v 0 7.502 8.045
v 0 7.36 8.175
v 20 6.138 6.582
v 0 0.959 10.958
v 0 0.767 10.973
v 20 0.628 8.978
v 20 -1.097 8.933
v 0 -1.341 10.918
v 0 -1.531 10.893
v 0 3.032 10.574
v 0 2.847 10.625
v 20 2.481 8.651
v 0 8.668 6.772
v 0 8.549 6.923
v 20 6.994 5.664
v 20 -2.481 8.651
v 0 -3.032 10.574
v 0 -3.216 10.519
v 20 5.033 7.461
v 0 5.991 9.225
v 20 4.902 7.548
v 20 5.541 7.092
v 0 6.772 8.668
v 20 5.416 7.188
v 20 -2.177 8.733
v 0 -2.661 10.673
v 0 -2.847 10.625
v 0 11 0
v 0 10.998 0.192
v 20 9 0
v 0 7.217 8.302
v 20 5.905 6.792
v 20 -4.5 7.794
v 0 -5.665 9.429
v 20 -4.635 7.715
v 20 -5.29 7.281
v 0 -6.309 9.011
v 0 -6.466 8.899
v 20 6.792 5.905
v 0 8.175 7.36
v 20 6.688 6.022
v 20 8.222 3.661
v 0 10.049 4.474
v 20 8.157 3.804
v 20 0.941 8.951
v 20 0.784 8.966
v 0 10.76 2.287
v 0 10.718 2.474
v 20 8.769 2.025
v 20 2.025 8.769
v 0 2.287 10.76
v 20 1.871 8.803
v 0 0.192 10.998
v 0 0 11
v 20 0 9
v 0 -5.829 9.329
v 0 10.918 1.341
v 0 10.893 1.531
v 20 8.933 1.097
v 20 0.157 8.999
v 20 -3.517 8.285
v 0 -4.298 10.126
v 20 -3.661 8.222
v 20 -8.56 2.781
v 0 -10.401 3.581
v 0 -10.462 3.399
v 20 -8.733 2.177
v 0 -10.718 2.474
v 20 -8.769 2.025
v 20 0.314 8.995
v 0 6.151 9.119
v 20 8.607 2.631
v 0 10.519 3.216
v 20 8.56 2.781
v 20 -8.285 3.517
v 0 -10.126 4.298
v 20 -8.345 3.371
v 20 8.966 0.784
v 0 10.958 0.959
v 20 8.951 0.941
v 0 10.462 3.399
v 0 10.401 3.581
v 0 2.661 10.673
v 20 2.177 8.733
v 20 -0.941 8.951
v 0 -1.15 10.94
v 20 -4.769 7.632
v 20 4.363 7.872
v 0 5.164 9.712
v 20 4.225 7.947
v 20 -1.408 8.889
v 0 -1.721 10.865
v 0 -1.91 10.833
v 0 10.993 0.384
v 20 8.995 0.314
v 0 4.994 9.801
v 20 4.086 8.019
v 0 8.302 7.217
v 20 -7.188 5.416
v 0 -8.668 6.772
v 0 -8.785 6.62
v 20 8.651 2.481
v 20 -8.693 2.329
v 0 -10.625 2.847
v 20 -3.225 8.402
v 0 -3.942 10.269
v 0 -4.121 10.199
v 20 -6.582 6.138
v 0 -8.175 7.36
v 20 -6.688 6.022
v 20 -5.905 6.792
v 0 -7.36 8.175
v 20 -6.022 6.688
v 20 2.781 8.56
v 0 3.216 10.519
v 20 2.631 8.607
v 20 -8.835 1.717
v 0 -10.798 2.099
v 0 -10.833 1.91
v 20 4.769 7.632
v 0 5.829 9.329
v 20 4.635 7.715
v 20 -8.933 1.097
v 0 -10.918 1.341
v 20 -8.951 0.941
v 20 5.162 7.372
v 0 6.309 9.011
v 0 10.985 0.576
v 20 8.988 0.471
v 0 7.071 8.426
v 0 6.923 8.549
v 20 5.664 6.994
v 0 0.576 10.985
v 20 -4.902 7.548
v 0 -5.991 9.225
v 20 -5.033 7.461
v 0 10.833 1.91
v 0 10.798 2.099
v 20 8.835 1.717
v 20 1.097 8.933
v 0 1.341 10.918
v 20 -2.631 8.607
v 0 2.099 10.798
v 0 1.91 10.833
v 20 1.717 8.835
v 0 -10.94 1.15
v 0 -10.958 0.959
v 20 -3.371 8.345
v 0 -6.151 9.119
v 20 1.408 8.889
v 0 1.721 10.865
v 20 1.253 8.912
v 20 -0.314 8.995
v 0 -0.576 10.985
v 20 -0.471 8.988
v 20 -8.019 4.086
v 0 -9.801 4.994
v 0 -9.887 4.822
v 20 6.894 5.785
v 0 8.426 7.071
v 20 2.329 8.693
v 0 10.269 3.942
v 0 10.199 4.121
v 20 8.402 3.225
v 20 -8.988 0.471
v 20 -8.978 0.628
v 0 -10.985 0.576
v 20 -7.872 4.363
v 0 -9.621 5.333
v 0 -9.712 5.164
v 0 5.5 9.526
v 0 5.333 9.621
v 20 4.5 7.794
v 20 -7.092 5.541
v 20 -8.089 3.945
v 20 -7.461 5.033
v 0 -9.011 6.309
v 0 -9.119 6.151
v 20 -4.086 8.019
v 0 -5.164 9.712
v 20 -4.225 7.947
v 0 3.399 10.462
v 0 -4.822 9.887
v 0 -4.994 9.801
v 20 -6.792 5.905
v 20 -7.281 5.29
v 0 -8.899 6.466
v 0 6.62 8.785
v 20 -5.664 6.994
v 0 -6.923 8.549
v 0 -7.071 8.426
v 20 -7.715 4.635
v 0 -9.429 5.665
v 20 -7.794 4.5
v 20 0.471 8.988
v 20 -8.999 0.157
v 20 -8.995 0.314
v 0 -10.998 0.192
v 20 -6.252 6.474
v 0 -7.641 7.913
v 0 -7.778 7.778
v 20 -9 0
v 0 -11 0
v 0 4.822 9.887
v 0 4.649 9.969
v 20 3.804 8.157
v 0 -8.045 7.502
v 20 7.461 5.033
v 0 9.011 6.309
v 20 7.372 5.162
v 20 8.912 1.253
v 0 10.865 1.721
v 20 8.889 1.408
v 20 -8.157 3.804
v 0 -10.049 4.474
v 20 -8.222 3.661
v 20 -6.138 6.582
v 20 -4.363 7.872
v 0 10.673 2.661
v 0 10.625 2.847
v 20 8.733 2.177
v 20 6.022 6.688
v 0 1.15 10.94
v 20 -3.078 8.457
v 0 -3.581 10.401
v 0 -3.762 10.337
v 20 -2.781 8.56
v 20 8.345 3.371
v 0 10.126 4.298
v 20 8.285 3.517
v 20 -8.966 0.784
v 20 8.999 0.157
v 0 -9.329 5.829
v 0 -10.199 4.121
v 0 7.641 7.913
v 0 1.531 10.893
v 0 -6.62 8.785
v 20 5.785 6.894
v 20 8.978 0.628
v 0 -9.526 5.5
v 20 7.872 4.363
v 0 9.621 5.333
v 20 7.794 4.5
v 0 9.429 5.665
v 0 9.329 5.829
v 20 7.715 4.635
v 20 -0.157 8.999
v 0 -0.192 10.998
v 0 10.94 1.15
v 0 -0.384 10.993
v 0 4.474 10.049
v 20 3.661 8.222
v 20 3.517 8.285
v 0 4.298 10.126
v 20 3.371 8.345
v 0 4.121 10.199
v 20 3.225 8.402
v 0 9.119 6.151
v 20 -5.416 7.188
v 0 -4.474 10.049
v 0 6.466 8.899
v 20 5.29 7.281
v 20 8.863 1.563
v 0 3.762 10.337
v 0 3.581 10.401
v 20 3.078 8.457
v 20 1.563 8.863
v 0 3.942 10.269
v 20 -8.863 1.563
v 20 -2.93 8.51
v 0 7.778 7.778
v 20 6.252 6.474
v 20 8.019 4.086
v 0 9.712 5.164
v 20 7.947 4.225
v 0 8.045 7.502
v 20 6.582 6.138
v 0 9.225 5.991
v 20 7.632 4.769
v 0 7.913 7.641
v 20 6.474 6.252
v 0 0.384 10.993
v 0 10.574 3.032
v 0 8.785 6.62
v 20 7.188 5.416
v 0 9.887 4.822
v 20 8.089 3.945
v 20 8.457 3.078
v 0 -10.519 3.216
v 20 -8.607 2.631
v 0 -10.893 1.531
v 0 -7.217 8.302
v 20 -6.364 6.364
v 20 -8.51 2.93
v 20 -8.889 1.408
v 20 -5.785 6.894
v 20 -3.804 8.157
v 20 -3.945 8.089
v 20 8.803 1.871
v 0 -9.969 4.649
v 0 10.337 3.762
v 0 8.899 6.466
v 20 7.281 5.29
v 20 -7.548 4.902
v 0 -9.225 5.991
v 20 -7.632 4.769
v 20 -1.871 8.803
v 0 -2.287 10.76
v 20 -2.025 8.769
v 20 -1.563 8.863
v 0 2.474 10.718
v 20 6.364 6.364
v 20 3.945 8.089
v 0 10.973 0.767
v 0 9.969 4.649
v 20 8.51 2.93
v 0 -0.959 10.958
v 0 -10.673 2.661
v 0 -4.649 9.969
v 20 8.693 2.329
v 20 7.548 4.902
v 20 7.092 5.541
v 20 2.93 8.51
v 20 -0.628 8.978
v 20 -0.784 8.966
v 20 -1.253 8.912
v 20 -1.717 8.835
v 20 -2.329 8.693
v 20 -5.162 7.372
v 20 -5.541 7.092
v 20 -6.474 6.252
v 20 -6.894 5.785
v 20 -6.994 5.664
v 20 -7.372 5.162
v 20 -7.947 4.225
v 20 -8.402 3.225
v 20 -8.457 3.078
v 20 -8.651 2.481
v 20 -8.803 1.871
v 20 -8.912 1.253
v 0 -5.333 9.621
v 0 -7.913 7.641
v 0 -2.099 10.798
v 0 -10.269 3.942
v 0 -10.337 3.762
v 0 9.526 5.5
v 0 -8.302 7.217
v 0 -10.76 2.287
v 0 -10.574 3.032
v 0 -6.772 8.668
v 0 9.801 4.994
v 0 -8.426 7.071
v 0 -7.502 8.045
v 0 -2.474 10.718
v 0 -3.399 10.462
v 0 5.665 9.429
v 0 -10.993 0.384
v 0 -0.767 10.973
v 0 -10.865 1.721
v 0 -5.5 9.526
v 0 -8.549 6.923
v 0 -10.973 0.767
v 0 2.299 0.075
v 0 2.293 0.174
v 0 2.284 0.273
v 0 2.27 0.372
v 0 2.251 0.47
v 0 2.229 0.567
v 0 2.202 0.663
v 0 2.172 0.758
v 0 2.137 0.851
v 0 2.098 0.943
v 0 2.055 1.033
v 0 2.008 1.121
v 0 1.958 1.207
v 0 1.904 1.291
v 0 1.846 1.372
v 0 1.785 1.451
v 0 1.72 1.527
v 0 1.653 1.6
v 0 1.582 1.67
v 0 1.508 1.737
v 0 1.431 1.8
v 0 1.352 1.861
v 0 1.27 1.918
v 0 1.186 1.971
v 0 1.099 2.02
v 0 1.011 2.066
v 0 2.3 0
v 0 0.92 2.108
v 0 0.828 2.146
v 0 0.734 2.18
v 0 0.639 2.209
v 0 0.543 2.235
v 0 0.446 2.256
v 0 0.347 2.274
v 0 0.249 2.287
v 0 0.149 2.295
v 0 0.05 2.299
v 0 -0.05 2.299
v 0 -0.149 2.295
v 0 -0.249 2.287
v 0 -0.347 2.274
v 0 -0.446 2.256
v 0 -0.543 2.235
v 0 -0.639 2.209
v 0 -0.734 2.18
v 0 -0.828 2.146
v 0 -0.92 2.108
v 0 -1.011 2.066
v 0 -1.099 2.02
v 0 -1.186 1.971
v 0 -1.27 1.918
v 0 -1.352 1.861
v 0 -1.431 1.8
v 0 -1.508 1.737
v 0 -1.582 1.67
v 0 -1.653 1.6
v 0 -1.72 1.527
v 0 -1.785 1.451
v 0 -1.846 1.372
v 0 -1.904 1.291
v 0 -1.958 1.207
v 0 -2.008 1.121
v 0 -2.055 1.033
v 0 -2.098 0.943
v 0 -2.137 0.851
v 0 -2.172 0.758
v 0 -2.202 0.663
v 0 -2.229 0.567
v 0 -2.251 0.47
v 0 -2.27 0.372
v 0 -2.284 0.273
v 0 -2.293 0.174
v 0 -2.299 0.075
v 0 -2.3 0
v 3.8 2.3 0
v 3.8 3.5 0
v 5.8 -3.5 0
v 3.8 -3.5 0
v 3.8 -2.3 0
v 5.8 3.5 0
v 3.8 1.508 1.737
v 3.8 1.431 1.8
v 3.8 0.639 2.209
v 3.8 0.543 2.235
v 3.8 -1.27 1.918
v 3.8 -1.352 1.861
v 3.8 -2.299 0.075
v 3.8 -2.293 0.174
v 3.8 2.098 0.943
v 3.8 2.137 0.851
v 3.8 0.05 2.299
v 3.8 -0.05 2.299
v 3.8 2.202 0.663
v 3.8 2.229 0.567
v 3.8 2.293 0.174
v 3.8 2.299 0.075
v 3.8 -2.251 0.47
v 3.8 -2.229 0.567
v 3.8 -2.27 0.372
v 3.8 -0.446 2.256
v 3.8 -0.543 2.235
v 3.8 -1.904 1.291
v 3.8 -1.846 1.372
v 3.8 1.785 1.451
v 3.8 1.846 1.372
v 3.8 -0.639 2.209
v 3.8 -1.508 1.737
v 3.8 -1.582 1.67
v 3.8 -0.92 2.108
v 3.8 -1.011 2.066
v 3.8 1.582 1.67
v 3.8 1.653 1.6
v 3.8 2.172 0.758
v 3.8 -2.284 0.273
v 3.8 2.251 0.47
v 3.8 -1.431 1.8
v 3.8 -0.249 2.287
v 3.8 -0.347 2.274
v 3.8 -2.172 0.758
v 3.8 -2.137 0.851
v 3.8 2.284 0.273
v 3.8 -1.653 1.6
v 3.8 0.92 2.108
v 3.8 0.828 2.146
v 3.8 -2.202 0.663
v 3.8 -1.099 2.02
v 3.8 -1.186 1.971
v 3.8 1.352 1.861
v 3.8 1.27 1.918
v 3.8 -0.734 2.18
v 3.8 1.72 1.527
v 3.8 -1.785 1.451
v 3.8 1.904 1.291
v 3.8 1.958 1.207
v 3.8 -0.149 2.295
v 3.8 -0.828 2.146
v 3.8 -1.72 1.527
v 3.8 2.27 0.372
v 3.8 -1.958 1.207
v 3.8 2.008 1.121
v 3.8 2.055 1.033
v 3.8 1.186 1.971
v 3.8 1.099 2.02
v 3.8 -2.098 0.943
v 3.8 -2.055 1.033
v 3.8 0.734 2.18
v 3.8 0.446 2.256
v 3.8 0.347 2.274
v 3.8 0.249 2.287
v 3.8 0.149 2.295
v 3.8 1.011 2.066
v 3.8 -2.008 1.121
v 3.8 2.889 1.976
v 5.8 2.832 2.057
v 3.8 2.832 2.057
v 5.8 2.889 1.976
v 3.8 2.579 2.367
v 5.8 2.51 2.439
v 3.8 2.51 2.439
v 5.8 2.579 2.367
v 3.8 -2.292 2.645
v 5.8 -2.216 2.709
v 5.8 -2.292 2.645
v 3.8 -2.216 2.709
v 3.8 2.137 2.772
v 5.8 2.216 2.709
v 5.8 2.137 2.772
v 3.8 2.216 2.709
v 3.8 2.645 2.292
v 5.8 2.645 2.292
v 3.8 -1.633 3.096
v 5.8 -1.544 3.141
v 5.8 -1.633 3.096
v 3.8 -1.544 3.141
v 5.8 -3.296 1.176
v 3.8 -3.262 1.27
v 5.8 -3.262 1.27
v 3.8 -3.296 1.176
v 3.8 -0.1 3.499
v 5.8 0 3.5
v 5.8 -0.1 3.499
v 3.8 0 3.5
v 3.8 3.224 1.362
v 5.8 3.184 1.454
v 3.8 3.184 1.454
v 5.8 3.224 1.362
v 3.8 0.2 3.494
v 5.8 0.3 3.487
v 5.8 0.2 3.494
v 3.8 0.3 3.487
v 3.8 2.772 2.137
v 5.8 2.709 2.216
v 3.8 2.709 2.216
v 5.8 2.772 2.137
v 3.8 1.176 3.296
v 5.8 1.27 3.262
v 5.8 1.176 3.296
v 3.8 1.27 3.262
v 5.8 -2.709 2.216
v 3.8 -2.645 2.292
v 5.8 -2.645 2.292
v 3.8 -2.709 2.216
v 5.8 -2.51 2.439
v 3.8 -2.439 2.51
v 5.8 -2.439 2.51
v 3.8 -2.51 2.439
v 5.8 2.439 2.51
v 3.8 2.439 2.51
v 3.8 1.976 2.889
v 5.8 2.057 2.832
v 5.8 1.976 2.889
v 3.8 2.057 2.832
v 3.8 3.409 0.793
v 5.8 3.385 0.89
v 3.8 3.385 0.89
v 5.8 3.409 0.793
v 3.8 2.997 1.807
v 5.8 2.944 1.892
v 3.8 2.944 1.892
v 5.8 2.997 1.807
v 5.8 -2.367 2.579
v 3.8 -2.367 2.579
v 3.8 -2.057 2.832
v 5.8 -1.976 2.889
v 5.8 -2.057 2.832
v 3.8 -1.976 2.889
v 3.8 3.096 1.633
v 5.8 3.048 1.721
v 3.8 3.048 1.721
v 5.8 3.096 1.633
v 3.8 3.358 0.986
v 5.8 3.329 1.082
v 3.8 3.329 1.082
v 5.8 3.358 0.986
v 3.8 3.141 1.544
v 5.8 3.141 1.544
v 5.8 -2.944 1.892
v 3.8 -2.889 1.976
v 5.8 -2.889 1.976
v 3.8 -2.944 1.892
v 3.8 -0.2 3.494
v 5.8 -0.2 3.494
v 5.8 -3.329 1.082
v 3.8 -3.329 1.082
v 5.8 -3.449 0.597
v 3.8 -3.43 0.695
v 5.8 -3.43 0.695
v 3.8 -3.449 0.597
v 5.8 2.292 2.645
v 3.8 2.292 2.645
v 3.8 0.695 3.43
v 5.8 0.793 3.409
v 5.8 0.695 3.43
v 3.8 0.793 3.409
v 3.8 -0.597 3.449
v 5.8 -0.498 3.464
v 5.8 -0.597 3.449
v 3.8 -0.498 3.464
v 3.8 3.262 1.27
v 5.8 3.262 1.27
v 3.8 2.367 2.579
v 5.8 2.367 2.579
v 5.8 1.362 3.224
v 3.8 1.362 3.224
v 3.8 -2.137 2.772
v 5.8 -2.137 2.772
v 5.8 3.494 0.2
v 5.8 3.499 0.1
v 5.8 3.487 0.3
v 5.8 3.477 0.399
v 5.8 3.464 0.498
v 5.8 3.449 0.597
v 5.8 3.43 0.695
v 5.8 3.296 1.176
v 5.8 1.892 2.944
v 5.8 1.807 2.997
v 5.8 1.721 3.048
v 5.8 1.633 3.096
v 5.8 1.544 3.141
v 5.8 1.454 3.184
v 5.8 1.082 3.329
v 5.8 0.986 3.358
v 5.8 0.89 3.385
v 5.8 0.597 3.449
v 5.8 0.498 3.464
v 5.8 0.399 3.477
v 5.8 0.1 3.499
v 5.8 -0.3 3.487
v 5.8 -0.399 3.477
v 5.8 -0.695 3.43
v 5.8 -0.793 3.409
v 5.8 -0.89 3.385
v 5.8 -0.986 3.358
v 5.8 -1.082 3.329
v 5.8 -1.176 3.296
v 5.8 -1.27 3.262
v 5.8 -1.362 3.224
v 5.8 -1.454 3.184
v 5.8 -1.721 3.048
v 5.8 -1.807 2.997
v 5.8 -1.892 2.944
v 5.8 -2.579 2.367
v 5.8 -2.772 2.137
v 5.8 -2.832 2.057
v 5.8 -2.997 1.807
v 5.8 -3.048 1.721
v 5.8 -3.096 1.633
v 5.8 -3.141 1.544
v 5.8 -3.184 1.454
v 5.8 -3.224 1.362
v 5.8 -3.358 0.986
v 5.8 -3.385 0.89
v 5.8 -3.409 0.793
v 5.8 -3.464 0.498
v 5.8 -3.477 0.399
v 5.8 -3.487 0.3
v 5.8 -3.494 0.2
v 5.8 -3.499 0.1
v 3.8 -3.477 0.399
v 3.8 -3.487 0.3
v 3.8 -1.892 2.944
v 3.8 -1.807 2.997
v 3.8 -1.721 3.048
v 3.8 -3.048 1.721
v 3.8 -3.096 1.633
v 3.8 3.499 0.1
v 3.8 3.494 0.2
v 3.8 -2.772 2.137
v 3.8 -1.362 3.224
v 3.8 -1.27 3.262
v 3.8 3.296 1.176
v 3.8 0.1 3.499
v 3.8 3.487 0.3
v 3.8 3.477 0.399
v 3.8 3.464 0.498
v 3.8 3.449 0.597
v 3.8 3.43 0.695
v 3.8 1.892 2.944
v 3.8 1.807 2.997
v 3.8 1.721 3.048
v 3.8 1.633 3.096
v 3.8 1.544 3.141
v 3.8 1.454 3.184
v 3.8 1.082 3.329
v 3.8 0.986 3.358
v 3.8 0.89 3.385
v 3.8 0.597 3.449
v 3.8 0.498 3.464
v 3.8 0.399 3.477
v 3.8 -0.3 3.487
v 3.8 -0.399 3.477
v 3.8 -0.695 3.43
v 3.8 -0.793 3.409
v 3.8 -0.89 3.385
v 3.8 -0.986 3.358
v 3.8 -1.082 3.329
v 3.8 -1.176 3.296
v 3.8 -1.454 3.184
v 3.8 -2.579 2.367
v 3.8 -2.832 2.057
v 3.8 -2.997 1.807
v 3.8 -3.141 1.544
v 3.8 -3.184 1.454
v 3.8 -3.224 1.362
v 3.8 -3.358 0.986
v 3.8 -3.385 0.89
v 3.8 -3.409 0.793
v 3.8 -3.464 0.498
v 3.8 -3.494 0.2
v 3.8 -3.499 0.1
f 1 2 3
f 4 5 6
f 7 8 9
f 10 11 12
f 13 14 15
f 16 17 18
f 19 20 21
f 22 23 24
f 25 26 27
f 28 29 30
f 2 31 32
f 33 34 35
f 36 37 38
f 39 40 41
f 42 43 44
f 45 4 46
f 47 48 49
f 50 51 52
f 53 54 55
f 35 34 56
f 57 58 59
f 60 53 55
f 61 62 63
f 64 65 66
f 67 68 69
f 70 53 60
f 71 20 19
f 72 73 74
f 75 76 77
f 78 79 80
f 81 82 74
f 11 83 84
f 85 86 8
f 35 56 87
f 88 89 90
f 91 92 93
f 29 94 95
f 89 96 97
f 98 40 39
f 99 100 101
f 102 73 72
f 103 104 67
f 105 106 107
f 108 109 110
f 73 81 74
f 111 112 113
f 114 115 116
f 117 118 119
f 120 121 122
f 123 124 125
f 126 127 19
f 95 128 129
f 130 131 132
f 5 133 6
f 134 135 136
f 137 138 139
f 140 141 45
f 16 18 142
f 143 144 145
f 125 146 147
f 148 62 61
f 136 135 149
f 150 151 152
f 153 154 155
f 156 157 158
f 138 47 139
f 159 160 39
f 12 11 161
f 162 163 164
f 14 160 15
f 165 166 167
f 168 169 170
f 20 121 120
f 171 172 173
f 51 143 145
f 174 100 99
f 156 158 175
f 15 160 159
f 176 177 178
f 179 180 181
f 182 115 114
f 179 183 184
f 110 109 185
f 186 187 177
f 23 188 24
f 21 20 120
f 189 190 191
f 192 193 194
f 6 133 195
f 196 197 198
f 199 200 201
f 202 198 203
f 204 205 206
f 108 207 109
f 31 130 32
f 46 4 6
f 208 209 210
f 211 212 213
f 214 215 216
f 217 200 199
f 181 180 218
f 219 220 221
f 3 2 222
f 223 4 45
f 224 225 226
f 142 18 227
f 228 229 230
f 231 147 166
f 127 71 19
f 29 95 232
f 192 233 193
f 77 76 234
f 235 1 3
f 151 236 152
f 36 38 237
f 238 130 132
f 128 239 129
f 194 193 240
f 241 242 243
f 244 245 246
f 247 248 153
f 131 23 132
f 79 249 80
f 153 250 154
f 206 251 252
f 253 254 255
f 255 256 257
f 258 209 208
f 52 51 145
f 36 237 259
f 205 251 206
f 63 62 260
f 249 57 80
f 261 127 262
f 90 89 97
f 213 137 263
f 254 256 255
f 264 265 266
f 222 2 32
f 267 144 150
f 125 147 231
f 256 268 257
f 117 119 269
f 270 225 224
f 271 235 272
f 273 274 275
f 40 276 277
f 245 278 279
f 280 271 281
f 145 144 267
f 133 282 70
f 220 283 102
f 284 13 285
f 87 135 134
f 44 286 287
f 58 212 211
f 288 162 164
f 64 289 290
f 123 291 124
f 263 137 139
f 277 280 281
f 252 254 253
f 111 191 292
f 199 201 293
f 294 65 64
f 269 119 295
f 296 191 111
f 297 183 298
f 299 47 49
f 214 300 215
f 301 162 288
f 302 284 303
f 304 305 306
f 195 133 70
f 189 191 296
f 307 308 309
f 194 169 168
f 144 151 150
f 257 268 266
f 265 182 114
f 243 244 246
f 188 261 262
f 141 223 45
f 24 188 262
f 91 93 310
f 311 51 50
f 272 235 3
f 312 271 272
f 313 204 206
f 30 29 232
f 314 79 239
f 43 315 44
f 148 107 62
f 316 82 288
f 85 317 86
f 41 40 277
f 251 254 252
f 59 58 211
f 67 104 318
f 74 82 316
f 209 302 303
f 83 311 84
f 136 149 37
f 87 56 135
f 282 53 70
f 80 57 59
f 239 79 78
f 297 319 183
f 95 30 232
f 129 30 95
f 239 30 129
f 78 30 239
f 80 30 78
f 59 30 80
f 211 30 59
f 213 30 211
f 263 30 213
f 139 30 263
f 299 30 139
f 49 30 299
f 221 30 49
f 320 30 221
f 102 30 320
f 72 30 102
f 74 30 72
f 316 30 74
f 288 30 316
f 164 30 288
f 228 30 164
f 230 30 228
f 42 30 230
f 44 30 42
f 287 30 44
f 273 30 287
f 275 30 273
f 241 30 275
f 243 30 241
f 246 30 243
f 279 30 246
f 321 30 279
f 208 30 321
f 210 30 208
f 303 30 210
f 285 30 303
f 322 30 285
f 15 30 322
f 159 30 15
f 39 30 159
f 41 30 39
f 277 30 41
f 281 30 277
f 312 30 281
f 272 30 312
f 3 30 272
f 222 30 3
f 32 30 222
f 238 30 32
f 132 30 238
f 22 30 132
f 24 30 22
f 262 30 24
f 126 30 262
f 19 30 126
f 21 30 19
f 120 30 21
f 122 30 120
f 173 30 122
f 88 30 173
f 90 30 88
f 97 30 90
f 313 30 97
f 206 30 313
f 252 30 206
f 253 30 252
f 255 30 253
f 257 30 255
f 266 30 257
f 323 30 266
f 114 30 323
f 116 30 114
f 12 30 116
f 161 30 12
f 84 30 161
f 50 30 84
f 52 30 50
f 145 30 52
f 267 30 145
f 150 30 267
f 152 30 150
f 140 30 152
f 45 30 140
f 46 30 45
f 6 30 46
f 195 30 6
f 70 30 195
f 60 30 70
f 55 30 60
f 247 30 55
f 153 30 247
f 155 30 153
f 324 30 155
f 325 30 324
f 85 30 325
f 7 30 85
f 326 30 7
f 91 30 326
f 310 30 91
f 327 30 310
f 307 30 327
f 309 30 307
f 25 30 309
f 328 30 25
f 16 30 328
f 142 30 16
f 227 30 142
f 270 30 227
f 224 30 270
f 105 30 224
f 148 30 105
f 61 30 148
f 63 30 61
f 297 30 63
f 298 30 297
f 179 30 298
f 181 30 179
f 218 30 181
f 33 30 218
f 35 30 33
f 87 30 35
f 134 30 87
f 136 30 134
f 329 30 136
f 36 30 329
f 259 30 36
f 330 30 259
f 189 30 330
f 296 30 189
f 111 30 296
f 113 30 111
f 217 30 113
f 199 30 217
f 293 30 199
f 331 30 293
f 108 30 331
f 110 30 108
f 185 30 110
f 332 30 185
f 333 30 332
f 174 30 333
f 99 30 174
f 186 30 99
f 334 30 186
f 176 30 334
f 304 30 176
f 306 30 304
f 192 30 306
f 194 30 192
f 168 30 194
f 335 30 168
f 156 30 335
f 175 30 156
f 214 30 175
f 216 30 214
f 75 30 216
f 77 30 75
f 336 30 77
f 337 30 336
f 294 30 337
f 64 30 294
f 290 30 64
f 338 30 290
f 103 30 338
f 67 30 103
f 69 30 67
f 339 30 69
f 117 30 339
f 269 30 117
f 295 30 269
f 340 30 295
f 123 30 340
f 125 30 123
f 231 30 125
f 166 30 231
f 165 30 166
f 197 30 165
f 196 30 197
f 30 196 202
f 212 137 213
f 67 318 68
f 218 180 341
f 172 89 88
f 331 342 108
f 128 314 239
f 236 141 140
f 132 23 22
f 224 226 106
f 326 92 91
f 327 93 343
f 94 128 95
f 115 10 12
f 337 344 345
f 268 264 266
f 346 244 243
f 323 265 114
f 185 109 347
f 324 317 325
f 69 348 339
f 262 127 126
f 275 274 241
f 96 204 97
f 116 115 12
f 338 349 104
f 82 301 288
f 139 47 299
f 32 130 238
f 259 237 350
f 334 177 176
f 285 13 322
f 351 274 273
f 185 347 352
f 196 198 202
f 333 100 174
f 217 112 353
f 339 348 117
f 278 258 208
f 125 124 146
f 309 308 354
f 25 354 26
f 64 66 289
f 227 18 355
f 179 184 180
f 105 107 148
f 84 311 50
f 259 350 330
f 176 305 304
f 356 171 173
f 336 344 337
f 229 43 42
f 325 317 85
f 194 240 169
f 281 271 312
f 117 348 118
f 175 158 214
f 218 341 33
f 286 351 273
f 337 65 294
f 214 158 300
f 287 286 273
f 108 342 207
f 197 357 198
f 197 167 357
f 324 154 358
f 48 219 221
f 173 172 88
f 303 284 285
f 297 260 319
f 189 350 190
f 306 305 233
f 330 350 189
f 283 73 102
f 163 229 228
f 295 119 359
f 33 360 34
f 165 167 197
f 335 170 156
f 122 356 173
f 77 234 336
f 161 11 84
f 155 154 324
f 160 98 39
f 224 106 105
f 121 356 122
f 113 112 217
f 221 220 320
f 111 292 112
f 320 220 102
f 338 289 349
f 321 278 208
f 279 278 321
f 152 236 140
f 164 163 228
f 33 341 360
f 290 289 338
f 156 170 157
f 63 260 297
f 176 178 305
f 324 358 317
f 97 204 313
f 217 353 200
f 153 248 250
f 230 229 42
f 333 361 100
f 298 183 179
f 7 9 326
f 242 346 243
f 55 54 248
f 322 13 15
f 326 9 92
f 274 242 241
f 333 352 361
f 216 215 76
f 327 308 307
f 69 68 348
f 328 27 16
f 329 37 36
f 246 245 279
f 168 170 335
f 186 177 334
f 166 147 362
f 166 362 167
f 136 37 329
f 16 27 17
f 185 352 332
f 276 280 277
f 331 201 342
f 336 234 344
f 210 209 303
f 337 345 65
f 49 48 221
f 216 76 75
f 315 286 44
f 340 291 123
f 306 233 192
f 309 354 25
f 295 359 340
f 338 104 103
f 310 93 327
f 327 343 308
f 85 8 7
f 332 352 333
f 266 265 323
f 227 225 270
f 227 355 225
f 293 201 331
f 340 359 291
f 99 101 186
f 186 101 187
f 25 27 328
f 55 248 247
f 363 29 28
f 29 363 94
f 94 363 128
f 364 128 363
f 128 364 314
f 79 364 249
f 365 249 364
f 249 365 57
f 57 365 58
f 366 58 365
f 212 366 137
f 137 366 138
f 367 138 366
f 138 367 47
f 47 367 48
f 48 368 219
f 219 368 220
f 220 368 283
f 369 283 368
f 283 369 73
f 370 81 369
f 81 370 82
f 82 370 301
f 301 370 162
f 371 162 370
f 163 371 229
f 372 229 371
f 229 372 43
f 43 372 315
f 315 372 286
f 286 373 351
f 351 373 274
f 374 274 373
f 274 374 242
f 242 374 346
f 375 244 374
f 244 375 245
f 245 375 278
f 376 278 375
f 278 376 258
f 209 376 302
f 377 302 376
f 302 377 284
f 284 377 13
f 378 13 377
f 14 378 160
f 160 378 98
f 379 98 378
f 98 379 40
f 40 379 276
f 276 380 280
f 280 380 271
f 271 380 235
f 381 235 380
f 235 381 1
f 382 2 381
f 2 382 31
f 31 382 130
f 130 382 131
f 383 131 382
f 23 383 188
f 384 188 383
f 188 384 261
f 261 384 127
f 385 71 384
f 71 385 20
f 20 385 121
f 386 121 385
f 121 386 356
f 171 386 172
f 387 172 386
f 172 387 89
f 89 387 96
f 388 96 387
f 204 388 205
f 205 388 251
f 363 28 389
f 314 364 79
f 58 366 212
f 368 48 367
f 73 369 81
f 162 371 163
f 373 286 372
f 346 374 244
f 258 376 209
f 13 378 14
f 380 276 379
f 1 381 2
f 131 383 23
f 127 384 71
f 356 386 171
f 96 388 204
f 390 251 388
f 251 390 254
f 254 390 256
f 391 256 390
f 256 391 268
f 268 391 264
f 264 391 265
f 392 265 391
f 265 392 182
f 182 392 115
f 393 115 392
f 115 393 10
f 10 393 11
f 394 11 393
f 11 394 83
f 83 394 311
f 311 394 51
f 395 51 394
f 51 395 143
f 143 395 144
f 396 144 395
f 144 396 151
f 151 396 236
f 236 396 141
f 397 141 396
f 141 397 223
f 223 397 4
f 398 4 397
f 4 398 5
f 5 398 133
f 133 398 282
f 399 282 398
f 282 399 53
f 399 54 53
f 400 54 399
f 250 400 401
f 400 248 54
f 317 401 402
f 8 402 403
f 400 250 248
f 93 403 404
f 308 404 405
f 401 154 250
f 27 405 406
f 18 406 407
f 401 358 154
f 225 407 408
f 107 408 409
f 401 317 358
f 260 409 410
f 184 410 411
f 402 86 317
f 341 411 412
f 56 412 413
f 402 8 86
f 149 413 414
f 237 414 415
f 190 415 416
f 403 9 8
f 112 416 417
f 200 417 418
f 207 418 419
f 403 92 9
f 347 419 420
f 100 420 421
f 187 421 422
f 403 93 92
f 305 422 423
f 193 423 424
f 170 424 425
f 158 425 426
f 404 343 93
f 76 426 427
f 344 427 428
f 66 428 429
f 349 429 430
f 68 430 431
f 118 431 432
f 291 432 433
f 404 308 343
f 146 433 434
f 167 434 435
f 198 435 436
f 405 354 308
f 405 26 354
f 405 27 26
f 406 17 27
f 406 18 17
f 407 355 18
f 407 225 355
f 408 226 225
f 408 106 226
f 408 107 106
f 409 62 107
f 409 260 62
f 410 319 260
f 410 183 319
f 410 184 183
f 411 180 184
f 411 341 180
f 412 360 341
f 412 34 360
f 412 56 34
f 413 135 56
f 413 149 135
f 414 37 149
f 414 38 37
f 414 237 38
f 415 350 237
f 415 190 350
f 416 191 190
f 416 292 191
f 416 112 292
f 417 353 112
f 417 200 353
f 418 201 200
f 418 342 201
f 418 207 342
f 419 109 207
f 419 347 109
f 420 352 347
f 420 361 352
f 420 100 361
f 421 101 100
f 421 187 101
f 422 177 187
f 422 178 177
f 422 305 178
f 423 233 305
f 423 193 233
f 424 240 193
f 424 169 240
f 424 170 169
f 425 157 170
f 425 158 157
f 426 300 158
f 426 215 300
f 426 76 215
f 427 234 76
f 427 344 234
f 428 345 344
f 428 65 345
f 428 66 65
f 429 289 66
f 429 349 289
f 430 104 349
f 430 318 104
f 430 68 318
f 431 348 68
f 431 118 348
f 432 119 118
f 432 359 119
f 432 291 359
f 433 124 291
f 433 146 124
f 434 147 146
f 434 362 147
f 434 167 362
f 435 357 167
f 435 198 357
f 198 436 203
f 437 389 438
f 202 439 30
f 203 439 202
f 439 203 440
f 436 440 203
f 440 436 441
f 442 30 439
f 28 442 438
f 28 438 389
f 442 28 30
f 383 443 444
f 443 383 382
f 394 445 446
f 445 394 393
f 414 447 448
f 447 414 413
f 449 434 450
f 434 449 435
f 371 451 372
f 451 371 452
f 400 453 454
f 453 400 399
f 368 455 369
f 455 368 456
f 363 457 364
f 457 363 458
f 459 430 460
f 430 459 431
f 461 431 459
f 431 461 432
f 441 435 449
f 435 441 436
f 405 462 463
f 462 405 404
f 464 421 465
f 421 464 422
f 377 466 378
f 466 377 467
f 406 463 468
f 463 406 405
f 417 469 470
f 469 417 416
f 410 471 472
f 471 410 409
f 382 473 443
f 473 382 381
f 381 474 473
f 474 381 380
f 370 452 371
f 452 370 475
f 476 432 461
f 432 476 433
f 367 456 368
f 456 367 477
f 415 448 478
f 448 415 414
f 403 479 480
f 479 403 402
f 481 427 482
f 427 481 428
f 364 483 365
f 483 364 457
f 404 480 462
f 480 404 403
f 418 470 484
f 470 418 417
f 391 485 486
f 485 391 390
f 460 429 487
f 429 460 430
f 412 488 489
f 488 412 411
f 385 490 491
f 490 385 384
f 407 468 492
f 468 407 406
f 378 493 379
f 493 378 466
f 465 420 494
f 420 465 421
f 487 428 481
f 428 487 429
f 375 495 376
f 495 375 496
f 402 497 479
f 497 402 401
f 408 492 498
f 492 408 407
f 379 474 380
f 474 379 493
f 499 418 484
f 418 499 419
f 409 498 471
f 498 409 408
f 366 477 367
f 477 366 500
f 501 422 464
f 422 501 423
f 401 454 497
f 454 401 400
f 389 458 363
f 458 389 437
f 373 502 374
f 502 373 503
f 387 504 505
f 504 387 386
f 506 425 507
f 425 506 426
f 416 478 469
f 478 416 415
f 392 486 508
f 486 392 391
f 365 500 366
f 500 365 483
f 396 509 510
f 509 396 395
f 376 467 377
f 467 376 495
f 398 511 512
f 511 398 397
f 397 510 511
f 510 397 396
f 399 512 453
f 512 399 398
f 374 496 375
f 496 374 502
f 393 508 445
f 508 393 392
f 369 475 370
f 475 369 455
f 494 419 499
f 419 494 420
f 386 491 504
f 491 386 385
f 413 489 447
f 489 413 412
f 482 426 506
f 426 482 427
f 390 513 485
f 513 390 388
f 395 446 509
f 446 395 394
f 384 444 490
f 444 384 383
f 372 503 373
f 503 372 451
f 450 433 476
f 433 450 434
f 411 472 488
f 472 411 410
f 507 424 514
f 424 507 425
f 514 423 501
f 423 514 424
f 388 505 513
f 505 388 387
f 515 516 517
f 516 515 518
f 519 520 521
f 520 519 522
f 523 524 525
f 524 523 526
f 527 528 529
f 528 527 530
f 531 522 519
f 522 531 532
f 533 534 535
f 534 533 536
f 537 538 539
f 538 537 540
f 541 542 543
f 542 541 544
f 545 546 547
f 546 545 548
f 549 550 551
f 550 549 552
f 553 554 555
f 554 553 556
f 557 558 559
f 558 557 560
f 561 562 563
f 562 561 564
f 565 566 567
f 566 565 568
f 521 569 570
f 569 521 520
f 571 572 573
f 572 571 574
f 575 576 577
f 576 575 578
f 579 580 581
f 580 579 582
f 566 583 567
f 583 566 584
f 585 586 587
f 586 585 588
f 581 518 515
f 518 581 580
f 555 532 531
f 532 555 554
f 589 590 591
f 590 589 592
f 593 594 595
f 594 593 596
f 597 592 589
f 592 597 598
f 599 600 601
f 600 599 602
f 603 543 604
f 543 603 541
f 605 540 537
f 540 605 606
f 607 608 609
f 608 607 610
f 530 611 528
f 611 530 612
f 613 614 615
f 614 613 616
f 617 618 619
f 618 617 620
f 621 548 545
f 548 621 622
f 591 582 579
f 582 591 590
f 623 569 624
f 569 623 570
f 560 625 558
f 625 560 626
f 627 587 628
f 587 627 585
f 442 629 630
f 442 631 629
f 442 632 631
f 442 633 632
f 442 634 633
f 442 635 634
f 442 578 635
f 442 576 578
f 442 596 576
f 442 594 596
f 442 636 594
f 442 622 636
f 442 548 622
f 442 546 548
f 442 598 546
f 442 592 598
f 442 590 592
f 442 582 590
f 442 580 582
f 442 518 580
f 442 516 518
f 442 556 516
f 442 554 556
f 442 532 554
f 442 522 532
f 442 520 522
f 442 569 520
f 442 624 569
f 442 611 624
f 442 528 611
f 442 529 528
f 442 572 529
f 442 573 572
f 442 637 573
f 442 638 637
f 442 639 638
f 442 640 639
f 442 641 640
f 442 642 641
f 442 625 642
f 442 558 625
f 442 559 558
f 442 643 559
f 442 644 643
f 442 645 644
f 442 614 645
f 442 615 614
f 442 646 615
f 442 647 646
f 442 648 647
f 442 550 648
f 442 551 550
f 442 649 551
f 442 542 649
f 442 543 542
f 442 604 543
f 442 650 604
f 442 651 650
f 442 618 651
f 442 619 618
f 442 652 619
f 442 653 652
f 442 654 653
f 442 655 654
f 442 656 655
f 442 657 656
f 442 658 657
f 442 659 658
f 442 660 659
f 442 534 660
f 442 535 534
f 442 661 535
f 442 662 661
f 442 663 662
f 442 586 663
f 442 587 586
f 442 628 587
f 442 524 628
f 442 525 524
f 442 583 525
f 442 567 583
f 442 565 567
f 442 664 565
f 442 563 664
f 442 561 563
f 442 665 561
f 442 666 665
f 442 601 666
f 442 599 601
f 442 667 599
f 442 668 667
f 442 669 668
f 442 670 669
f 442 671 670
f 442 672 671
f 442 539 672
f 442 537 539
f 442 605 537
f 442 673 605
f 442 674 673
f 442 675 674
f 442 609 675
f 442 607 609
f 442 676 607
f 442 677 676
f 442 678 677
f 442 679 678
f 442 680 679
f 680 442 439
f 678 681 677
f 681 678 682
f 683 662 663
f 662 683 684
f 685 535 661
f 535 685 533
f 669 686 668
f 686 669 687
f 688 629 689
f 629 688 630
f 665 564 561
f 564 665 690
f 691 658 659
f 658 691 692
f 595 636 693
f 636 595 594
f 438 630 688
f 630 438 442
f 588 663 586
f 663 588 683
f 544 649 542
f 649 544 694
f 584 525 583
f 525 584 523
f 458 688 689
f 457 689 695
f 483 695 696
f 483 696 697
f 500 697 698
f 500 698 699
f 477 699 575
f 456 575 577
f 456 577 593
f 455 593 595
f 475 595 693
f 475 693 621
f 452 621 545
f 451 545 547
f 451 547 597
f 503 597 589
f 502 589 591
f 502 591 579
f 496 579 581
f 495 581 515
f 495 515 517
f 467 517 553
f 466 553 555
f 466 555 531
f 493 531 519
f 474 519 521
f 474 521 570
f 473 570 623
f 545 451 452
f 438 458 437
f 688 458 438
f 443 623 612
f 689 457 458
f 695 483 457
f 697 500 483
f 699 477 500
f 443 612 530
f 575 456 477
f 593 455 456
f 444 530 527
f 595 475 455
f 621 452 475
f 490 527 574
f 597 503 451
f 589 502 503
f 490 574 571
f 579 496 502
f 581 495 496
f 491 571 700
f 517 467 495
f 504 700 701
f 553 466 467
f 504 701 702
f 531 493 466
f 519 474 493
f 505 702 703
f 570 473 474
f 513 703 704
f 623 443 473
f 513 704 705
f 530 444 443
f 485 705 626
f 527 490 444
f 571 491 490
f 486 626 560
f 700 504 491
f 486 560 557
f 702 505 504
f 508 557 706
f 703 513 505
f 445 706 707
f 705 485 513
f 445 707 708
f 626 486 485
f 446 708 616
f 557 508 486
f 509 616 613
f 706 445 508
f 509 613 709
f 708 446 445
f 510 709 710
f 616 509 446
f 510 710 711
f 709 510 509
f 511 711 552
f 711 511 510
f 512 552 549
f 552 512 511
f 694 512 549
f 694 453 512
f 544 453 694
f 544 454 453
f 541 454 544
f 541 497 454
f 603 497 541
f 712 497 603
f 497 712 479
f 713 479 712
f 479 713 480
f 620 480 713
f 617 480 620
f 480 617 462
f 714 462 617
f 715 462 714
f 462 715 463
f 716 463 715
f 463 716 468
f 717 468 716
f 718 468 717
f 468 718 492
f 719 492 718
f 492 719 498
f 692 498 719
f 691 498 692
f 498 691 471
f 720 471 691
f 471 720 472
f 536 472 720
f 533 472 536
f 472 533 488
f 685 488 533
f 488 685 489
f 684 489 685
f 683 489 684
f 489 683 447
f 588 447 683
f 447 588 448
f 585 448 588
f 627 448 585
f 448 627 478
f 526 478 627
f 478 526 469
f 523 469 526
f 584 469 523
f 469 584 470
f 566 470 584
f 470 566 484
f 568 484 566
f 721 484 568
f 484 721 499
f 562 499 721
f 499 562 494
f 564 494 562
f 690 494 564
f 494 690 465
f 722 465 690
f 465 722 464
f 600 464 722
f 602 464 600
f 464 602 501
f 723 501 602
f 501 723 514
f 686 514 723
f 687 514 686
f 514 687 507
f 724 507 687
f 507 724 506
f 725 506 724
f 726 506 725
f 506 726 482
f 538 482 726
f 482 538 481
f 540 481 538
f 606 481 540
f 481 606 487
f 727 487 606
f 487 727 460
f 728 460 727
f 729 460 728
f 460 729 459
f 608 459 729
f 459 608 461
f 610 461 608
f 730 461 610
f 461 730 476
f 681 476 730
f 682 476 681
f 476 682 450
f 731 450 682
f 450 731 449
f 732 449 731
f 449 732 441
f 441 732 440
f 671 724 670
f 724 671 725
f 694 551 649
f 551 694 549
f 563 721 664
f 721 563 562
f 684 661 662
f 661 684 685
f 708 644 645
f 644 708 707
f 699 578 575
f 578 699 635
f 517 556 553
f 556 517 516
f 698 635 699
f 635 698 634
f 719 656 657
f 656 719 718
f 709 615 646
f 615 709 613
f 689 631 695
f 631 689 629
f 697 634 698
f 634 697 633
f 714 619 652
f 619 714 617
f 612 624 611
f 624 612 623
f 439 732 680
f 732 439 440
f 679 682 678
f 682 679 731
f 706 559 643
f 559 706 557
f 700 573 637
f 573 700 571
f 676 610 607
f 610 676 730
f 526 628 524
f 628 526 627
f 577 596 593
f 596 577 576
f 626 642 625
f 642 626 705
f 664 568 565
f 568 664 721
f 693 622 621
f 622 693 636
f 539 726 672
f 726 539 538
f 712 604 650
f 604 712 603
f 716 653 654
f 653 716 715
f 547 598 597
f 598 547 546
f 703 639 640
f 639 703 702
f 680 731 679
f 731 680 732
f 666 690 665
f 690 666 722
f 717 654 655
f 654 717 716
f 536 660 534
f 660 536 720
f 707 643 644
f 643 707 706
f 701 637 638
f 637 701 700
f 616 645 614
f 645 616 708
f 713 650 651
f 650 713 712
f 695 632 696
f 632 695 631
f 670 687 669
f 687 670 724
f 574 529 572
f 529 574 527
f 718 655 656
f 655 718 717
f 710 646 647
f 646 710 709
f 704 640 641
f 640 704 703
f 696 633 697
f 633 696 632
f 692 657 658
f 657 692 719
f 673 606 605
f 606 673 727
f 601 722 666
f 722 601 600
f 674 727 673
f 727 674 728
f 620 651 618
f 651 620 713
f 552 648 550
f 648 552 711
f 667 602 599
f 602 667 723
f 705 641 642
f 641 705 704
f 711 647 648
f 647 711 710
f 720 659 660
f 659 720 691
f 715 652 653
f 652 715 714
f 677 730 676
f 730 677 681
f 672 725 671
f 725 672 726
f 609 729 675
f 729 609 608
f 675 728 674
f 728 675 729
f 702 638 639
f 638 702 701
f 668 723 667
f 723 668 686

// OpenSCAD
$fa = 1;
$fs = 0.1;
rotate([0,90,0]) {
  difference() {
    cylinder(h=20,d1=22,d2=18);
    translate([0,-12,-0.01])
      cube([24,24,24],center=false);
    cylinder(h=4.4,d=4.6);
    translate([0,0,3.8])
      cylinder(h=2,d=7);
  }
}
